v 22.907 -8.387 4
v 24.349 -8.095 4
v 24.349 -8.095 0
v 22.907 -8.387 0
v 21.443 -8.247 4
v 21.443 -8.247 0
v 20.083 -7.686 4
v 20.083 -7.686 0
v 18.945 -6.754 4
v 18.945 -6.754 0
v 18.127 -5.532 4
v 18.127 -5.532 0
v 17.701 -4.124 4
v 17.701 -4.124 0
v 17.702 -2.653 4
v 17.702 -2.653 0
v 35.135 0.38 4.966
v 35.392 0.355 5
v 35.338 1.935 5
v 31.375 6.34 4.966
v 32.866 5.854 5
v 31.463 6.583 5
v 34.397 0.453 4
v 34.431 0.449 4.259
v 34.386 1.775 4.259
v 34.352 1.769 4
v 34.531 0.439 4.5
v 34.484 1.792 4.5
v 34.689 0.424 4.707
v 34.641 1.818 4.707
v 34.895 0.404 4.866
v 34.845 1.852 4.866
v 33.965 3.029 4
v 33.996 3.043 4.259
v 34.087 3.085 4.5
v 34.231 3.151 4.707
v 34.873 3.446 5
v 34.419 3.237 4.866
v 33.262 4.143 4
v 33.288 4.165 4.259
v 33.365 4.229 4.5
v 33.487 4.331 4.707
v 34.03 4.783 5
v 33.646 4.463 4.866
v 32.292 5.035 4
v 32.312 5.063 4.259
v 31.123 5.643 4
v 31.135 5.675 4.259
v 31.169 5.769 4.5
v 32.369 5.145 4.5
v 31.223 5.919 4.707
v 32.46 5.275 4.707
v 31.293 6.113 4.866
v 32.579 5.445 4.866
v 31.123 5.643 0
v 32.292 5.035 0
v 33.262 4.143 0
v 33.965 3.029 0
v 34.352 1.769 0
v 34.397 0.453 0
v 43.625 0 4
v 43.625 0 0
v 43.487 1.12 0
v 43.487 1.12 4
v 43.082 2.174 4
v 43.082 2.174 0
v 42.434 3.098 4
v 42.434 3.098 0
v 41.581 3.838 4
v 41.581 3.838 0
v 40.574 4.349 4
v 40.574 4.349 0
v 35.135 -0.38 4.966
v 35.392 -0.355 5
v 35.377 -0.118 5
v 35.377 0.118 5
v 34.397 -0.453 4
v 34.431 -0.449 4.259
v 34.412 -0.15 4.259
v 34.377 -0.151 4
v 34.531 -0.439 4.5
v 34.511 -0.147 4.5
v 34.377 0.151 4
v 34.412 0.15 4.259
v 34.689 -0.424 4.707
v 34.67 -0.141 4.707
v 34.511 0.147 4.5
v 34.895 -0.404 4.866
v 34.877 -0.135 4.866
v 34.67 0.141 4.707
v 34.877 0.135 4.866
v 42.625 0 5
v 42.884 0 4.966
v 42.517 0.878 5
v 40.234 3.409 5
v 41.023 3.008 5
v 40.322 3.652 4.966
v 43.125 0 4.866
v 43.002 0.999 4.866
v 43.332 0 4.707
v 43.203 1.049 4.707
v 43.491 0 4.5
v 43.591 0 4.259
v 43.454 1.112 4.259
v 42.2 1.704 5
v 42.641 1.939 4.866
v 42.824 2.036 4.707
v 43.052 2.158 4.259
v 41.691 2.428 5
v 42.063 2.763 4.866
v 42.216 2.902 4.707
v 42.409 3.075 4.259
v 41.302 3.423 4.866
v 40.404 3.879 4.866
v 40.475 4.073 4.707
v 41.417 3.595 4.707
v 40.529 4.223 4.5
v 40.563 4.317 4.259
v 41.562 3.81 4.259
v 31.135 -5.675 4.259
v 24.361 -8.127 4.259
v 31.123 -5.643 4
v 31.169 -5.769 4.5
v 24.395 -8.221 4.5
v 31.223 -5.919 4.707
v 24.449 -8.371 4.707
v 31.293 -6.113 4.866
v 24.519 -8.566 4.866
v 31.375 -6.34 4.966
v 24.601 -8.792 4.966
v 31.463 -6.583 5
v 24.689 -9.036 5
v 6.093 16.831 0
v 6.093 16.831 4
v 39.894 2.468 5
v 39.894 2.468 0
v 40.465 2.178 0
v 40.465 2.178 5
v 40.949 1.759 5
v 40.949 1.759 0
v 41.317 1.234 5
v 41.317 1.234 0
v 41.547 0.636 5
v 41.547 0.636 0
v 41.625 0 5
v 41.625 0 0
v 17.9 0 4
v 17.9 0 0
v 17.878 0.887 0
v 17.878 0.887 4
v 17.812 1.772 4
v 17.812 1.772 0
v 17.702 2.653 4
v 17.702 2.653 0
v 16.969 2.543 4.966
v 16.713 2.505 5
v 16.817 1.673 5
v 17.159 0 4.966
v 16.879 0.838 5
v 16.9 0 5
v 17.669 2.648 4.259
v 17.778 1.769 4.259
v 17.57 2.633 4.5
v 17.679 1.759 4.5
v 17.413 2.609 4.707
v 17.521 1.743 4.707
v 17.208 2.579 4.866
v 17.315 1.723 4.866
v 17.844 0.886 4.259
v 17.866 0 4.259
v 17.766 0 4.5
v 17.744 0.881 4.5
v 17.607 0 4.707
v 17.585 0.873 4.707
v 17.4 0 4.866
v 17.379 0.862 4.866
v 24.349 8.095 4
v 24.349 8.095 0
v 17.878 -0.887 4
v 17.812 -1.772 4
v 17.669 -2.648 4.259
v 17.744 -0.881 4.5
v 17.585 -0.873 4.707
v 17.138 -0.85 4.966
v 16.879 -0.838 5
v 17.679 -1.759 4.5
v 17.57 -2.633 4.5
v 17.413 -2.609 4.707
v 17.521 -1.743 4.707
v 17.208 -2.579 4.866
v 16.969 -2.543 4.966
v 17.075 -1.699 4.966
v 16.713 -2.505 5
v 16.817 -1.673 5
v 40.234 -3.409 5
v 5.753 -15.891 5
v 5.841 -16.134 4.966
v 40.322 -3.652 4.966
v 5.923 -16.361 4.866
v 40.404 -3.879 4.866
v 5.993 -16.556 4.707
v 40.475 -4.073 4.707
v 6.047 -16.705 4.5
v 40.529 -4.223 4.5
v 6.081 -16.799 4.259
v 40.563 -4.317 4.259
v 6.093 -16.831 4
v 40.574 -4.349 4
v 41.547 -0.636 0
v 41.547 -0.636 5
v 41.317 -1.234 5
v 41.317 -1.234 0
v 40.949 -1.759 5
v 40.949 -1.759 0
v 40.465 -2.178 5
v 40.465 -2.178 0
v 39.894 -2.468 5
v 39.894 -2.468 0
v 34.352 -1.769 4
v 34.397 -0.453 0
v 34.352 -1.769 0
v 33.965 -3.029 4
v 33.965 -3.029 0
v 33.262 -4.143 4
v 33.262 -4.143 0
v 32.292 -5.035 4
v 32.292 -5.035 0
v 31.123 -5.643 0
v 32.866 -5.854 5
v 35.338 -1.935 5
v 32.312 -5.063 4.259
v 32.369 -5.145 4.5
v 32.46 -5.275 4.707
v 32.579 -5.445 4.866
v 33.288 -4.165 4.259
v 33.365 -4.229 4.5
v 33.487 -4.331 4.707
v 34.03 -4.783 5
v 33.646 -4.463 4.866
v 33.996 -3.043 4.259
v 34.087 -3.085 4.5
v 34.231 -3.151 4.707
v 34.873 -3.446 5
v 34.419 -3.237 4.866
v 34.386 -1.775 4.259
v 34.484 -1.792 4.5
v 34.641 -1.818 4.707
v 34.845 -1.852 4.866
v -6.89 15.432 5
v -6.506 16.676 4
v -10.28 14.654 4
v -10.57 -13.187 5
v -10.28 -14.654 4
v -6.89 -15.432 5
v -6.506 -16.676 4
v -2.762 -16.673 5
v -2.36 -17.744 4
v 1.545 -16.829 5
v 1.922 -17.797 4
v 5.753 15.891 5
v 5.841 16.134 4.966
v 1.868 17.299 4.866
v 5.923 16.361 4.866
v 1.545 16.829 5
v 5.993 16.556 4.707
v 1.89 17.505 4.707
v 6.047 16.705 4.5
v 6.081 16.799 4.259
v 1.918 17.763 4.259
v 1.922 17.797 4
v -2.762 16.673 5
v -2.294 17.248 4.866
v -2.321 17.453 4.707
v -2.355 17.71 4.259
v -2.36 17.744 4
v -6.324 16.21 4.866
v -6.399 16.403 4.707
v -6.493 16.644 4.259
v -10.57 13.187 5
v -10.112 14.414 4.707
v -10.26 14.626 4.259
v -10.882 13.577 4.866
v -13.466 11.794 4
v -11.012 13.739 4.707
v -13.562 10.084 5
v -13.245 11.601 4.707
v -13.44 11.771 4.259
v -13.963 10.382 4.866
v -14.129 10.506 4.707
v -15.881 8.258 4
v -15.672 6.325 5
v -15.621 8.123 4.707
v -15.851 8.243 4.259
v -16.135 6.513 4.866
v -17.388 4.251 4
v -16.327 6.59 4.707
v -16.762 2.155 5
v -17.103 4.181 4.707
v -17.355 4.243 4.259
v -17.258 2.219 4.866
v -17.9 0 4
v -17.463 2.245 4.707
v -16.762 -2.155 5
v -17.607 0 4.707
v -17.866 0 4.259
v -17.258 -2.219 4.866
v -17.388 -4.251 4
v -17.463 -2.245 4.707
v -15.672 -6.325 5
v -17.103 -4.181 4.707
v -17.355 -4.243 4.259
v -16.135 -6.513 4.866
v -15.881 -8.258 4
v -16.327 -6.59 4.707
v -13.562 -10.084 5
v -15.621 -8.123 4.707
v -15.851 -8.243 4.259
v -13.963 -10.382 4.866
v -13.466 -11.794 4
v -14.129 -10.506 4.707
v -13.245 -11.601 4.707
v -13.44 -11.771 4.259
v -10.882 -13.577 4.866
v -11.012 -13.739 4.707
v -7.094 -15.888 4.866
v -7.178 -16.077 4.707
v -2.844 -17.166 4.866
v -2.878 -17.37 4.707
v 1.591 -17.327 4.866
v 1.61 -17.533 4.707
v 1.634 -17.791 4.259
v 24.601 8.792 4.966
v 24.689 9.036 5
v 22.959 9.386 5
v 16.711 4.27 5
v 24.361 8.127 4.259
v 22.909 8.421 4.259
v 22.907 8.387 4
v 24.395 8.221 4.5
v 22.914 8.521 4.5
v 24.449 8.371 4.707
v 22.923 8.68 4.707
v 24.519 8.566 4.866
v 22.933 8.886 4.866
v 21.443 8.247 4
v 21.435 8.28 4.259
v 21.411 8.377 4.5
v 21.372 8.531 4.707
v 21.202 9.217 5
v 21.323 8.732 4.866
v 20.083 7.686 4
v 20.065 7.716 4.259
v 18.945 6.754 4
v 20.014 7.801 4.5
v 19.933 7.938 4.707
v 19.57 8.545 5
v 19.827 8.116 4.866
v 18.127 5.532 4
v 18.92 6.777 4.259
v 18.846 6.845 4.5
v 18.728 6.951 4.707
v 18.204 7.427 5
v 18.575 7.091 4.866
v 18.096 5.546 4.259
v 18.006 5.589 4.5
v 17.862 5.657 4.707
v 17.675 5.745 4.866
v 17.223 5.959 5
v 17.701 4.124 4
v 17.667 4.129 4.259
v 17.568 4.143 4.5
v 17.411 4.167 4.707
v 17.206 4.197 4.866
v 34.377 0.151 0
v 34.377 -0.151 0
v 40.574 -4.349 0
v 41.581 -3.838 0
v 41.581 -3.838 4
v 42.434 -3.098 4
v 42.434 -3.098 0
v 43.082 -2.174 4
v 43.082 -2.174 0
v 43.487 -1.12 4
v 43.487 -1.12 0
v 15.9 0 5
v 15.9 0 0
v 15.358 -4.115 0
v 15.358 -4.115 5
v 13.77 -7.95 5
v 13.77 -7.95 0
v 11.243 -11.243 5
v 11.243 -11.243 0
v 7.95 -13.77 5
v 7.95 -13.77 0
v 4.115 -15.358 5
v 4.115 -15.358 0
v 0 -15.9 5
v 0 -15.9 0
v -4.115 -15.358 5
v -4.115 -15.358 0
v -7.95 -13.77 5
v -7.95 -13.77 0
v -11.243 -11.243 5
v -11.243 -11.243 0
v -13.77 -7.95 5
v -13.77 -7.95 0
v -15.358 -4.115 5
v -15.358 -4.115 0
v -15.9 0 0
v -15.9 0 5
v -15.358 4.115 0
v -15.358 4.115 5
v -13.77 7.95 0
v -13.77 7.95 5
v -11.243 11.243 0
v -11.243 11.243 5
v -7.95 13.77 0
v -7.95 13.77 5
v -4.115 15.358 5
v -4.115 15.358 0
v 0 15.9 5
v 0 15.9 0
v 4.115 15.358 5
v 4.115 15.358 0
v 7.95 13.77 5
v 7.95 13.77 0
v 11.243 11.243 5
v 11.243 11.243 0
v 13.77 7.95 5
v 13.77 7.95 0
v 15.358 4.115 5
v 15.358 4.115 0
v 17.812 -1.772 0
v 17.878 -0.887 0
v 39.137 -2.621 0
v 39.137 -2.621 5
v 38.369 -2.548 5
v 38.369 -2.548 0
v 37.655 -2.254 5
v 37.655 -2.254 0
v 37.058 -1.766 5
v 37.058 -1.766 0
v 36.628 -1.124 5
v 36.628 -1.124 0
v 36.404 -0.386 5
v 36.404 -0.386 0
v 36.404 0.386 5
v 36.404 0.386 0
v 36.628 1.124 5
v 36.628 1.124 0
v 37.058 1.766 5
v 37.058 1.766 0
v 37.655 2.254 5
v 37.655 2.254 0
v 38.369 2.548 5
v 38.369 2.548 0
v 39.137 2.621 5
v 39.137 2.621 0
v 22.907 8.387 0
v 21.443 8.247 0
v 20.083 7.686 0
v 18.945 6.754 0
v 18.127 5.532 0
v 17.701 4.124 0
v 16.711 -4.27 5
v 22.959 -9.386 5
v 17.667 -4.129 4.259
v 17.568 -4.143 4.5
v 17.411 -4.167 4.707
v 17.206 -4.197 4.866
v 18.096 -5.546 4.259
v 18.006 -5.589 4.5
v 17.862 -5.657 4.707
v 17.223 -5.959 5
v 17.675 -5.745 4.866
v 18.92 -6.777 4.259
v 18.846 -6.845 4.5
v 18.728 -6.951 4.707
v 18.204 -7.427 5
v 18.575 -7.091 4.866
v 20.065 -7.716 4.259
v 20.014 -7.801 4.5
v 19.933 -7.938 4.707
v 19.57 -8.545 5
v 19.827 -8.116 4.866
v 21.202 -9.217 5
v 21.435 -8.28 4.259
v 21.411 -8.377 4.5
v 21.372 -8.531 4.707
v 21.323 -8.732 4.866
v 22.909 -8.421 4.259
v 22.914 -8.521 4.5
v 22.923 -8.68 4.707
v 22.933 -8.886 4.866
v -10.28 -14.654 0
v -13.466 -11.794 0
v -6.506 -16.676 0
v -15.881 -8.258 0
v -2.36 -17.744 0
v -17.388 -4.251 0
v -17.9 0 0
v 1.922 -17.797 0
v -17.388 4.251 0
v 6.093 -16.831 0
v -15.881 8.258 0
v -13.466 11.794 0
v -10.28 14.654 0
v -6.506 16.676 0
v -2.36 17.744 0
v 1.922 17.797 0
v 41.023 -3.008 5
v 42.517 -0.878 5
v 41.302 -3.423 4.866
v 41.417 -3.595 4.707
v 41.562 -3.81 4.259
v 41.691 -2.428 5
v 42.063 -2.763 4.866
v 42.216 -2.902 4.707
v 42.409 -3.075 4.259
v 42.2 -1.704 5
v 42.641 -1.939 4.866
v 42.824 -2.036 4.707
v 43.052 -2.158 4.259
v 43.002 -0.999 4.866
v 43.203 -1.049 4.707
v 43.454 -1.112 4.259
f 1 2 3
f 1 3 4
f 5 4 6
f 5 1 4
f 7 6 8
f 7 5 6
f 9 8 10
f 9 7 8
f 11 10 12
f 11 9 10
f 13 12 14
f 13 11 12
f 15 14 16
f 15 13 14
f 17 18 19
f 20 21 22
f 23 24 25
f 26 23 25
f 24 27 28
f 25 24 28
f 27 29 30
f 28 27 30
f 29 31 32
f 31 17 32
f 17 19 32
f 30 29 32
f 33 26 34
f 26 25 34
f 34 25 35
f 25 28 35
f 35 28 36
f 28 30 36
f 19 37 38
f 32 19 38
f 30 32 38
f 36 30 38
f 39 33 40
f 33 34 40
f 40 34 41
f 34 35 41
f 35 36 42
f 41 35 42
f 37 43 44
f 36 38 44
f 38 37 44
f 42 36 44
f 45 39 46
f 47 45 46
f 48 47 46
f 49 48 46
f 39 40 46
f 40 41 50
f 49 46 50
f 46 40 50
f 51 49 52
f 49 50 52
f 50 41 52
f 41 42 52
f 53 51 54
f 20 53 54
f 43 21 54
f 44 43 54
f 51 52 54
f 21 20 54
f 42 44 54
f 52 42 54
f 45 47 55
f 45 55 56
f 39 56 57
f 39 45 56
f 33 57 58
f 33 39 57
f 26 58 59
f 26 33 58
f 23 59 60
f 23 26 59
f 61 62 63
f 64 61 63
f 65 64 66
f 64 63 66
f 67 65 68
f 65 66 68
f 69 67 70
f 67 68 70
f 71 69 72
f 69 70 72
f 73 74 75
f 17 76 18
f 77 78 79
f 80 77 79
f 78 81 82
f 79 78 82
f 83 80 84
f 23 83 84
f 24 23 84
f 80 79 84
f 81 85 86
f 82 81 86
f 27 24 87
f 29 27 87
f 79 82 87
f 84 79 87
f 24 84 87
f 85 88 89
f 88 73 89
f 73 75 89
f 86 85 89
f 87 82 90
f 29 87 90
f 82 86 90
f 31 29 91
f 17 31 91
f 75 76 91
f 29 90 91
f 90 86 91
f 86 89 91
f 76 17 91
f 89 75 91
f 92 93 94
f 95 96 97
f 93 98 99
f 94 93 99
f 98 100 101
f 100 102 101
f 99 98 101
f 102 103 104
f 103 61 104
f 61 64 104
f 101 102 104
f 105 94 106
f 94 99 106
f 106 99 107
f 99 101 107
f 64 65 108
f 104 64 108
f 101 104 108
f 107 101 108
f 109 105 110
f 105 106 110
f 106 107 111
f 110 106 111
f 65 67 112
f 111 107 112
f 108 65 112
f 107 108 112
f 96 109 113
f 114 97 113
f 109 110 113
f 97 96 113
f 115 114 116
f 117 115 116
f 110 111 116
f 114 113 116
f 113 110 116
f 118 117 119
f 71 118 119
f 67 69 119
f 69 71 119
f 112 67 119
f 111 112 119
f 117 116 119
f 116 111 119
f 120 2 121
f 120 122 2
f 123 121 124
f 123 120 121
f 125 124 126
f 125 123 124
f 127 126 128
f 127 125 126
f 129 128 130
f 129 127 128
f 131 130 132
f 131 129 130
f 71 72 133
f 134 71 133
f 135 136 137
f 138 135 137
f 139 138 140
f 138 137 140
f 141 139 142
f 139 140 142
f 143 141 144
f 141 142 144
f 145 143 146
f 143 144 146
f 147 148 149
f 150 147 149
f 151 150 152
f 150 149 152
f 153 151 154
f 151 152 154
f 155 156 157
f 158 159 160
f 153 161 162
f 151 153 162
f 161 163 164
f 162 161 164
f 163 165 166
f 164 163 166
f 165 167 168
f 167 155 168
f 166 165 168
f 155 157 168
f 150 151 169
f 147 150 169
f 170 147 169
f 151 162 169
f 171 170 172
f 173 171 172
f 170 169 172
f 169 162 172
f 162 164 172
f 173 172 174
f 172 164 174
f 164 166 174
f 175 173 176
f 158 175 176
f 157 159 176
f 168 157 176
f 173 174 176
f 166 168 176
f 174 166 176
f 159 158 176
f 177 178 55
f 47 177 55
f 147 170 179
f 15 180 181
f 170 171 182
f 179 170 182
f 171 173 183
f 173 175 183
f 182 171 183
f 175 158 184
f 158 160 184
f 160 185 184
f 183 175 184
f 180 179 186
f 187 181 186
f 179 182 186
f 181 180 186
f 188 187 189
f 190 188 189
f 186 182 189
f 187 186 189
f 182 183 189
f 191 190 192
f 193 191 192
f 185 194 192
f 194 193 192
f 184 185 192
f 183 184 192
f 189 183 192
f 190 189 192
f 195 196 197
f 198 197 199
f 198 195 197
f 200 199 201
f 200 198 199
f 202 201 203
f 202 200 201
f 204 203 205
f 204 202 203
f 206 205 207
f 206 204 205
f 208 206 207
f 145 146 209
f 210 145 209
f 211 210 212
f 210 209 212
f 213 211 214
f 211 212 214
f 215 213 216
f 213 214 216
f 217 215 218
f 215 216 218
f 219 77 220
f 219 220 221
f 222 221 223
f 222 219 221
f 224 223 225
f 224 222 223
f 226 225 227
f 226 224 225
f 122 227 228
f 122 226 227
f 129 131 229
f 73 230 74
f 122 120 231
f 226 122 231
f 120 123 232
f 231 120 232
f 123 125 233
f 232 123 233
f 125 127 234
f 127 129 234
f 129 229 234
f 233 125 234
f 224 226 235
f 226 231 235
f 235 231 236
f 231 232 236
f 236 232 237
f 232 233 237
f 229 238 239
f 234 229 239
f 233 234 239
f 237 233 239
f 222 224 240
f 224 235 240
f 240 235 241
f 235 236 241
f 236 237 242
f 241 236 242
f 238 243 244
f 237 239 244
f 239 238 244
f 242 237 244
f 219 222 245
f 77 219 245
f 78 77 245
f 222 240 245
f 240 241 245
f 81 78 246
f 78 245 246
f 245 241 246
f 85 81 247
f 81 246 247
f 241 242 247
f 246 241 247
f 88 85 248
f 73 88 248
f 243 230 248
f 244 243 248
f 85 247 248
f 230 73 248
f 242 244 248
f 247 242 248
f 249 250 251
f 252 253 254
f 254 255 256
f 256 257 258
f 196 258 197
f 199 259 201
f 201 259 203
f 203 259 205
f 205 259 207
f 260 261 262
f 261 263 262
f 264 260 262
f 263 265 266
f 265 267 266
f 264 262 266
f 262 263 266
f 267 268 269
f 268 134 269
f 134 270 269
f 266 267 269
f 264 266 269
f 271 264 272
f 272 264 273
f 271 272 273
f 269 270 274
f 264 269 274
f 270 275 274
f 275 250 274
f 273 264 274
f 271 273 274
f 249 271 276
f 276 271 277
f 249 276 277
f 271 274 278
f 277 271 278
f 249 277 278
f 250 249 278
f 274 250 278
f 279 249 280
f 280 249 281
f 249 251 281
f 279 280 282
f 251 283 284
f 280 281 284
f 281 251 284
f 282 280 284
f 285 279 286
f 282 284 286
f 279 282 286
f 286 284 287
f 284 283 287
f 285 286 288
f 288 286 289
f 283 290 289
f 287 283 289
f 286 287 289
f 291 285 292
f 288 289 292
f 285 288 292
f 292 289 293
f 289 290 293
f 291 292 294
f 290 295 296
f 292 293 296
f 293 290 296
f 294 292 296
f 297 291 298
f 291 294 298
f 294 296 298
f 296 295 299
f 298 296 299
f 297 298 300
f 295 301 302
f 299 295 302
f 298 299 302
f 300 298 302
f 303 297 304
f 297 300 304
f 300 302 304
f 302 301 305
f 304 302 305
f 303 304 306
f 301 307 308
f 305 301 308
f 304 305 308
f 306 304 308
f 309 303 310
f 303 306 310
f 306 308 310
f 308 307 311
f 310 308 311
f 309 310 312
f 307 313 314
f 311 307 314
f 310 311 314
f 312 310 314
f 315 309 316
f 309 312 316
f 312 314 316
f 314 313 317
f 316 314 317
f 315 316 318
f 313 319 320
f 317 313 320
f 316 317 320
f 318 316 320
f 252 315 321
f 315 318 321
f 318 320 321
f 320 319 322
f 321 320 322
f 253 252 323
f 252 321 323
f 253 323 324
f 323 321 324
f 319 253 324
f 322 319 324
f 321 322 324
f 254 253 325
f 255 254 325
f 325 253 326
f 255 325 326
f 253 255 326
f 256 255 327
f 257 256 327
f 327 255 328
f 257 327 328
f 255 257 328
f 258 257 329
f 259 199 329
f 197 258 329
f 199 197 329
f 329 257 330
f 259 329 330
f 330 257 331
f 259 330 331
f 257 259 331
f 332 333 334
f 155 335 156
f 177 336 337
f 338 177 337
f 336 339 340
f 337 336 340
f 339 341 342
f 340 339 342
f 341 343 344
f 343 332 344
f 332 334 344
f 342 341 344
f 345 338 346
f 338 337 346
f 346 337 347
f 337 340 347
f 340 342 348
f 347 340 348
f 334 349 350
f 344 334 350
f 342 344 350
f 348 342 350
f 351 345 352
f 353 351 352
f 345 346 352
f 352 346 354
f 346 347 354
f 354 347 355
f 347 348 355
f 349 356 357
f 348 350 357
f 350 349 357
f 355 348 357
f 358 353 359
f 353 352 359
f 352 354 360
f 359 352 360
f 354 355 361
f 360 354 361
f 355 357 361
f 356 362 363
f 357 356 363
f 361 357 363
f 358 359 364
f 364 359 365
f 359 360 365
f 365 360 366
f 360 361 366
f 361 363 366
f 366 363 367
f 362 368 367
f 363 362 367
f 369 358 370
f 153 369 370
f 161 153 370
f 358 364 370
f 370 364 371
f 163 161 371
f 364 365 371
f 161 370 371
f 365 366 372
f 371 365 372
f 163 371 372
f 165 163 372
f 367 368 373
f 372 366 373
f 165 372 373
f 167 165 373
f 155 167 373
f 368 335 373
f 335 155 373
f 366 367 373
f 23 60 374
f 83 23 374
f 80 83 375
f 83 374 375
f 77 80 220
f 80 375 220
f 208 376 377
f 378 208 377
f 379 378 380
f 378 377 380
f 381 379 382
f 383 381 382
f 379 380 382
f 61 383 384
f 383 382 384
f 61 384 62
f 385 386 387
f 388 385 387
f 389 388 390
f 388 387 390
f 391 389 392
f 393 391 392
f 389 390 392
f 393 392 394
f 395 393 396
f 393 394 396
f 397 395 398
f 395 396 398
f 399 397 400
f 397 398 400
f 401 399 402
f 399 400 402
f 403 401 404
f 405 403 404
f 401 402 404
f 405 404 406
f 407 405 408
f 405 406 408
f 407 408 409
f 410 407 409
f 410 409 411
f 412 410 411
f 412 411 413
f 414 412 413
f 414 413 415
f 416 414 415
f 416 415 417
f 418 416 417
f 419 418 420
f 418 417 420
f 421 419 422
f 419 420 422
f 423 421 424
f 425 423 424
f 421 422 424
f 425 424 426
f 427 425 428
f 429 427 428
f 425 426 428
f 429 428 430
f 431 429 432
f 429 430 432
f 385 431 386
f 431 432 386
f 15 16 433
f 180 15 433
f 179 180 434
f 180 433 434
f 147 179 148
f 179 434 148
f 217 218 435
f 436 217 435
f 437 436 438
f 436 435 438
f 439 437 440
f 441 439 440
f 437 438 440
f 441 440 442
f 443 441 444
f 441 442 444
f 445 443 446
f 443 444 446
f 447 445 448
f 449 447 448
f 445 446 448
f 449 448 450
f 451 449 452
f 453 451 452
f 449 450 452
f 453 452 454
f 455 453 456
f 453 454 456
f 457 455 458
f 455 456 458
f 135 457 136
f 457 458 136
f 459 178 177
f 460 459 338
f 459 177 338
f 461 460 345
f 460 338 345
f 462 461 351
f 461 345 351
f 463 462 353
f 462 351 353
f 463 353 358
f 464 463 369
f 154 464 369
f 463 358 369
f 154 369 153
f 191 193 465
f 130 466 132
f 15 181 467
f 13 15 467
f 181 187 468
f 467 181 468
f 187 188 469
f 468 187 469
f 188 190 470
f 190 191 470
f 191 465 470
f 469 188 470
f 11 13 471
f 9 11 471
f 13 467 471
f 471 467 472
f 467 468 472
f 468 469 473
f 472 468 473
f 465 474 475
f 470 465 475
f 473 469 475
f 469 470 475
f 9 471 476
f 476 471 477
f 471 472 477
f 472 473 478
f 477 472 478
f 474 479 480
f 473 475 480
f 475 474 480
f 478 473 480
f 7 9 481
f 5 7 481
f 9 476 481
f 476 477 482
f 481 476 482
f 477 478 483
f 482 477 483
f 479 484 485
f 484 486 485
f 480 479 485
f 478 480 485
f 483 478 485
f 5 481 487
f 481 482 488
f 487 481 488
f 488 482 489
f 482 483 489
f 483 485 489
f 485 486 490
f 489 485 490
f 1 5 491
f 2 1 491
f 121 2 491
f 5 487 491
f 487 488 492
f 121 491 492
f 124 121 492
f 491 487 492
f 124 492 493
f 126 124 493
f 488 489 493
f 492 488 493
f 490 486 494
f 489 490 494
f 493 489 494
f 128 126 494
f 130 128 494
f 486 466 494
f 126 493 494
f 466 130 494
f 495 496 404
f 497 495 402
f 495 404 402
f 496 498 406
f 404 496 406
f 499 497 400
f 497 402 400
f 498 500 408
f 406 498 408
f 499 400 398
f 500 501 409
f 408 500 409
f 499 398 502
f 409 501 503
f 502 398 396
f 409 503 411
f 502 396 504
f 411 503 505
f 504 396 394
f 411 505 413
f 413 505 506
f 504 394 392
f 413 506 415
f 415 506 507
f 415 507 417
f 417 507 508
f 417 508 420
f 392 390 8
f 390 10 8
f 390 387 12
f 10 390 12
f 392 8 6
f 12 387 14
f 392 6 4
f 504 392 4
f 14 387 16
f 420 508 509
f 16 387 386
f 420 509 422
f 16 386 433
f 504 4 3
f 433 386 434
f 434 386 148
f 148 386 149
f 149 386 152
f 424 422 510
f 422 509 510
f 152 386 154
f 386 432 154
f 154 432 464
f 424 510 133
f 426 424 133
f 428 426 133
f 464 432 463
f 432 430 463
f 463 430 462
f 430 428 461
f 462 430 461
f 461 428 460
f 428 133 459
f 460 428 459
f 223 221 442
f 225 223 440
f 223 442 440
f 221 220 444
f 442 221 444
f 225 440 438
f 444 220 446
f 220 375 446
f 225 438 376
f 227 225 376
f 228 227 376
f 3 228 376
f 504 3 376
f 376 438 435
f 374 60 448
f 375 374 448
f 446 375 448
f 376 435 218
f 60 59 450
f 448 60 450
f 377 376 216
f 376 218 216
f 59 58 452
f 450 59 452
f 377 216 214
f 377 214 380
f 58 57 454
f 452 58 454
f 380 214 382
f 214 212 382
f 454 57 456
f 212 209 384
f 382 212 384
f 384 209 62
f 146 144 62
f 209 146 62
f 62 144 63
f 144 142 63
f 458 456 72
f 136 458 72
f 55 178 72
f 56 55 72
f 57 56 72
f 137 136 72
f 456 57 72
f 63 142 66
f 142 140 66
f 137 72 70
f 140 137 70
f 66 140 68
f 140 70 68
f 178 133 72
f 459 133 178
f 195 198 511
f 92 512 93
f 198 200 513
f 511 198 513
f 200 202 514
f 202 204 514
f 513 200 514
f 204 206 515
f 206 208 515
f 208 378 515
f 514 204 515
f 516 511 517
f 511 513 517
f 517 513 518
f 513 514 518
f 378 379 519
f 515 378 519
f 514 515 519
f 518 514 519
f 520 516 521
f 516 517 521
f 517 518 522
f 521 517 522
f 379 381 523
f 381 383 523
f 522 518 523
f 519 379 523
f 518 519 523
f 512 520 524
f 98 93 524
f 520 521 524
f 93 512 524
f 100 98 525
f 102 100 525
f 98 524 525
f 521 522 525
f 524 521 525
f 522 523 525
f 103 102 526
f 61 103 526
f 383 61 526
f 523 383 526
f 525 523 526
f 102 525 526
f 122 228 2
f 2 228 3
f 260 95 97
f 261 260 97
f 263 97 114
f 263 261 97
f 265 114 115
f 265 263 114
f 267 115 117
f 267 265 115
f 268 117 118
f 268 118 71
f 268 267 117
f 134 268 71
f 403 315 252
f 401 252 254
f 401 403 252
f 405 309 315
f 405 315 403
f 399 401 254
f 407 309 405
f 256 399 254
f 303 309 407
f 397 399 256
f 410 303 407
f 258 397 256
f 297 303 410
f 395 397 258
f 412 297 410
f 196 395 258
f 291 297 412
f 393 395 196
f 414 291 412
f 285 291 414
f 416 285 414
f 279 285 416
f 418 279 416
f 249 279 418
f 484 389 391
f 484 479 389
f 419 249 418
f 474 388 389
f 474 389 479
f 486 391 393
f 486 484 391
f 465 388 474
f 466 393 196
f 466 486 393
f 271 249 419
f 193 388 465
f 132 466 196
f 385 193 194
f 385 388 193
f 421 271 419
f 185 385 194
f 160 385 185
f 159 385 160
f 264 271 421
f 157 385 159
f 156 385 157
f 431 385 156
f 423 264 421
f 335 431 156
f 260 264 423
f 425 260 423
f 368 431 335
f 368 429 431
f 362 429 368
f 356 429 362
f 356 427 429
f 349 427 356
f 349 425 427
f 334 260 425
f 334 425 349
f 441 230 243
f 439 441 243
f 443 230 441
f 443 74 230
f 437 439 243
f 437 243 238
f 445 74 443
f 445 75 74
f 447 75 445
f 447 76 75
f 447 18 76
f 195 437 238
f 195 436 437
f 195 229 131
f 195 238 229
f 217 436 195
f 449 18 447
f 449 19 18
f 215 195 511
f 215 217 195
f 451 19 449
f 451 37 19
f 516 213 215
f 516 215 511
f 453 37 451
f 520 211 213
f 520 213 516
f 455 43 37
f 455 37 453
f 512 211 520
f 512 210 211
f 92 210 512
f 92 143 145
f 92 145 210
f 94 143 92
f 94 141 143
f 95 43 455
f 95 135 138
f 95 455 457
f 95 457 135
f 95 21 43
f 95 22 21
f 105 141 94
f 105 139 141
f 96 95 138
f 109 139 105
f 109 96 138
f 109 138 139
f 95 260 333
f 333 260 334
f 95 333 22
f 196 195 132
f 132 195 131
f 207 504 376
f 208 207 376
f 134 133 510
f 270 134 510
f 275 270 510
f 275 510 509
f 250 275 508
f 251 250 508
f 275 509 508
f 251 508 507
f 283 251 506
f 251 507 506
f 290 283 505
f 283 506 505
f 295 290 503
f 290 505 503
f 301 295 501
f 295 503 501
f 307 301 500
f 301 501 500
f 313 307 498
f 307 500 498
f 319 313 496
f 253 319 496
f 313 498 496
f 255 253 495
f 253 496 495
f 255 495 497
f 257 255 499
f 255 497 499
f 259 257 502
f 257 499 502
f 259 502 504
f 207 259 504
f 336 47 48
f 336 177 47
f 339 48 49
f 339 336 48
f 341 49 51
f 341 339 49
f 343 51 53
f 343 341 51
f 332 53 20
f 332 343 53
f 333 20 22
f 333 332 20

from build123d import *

# Parameters (mm, degrees)
F1_DEPTH = 5
F2_R     = 5
F3_R     = 0.99999


# Not quite as in the source:
# - a fillet or chamfer is up to 0.001 mm smaller than in the source, because OpenCascade refuses the exact size


with BuildPart() as f1:
    # F0 (on Top) → F1 (new body)
    with BuildSketch(Plane.XY):
        with BuildLine():
            ThreePointArc((5.4121153846, -14.9505520655), (-15.9, 0), (5.4121153846, 14.9505520655))
            Line((5.4121153846, 14.9505520655), (13.1430758683, 12.1519363363))
            ThreePointArc((13.1430758683, 12.1519363363), (9.898446583, 14.91411262), (6.0928846154, 16.8311246524))
            ThreePointArc((6.0928846154, 16.8311246524), (-17.9, 0), (6.0928846154, -16.8311246524))
            ThreePointArc((6.0928846154, -16.8311246524), (9.898446583, -14.91411262), (13.1430758683, -12.1519363363))
            Line((13.1430758683, -12.1519363363), (5.4121153846, -14.9505520655))
        make_face()
        with BuildLine():
            ThreePointArc((6.0928846154, 16.8311246524), (9.898446583, 14.91411262), (13.1430758683, 12.1519363363))
            Line((13.1430758683, 12.1519363363), (36.3130060827, 3.76439752))
            ThreePointArc((36.3130060827, 3.76439752), (38.3715715504, 4.5821067953), (40.5742788462, 4.3488241071))
            Line((40.5742788462, 4.3488241071), (6.0928846154, 16.8311246524))
        make_face()
        with BuildLine():
            Line((36.3130060827, -3.76439752), (13.1430758683, -12.1519363363))
            ThreePointArc((13.1430758683, -12.1519363363), (9.898446583, -14.91411262), (6.0928846154, -16.8311246524))
            Line((6.0928846154, -16.8311246524), (40.5742788462, -4.3488241071))
            ThreePointArc((40.5742788462, -4.3488241071), (38.3715715504, -4.5821067953), (36.3130060827, -3.76439752))
        make_face()
        with BuildLine():
            ThreePointArc((40.5742788462, 4.3488241071), (38.3715715504, 4.5821067953), (36.3130060827, 3.76439752))
            Line((36.3130060827, 3.76439752), (39.8935096154, 2.4682515202))
            ThreePointArc((39.8935096154, 2.4682515202), (41.1489634409, 1.507508252), (41.625, 0))
            ThreePointArc((41.625, 0), (41.1489634409, -1.507508252), (39.8935096154, -2.4682515202))
            Line((39.8935096154, -2.4682515202), (36.3130060827, -3.76439752))
            ThreePointArc((36.3130060827, -3.76439752), (38.3715715504, -4.5821067953), (40.5742788462, -4.3488241071))
            ThreePointArc((40.5742788462, -4.3488241071), (42.7862689196, -2.6560859678), (43.625, 0))
            ThreePointArc((43.625, 0), (42.7862689196, 2.6560859678), (40.5742788462, 4.3488241071))
        make_face()
        with BuildLine():
            Line((39.8935096154, 2.4682515202), (36.3130060827, 3.76439752))
            ThreePointArc((36.3130060827, 3.76439752), (34.375, 0), (36.3130060827, -3.76439752))
            Line((36.3130060827, -3.76439752), (39.8935096154, -2.4682515202))
            ThreePointArc((39.8935096154, -2.4682515202), (36.375, 0), (39.8935096154, 2.4682515202))
        make_face()
        with BuildLine():
            ThreePointArc((5.4121153846, 14.9505520655), (13.0165785561, 9.1311928406), (15.9, 0))
            ThreePointArc((15.9, 0), (13.0165785561, -9.1311928406), (5.4121153846, -14.9505520655))
            Line((5.4121153846, -14.9505520655), (13.1430758683, -12.1519363363))
            ThreePointArc((13.1430758683, -12.1519363363), (16.6683991139, -6.5249115687), (17.9, 0))
            ThreePointArc((17.9, 0), (16.6683991139, 6.5249115687), (13.1430758683, 12.1519363363))
            Line((13.1430758683, 12.1519363363), (5.4121153846, 14.9505520655))
        make_face()
    extrude(amount=F1_DEPTH)

    # F2
    f2_edges = [f1.edges().sort_by_distance(p)[0] for p in [
        (36.313006, 3.764398, 2.5),
        (36.313006, -3.764398, 2.5),
        (13.143076, 12.151936, 2.5),
        (13.143076, -12.151936, 2.5),
    ]]
    fillet(f2_edges, radius=F2_R)

    # F3 (radius 1 in the source; OpenCascade refuses exactly that, so slightly less here)
    f3_edges = [f1.edges().sort_by_distance(p)[0] for p in [
        (23.333582, 10.589974, 5),
        (19.479429, 7.262513, 5),
    ]]
    fillet(f3_edges, radius=F3_R)


solid = f1.part
